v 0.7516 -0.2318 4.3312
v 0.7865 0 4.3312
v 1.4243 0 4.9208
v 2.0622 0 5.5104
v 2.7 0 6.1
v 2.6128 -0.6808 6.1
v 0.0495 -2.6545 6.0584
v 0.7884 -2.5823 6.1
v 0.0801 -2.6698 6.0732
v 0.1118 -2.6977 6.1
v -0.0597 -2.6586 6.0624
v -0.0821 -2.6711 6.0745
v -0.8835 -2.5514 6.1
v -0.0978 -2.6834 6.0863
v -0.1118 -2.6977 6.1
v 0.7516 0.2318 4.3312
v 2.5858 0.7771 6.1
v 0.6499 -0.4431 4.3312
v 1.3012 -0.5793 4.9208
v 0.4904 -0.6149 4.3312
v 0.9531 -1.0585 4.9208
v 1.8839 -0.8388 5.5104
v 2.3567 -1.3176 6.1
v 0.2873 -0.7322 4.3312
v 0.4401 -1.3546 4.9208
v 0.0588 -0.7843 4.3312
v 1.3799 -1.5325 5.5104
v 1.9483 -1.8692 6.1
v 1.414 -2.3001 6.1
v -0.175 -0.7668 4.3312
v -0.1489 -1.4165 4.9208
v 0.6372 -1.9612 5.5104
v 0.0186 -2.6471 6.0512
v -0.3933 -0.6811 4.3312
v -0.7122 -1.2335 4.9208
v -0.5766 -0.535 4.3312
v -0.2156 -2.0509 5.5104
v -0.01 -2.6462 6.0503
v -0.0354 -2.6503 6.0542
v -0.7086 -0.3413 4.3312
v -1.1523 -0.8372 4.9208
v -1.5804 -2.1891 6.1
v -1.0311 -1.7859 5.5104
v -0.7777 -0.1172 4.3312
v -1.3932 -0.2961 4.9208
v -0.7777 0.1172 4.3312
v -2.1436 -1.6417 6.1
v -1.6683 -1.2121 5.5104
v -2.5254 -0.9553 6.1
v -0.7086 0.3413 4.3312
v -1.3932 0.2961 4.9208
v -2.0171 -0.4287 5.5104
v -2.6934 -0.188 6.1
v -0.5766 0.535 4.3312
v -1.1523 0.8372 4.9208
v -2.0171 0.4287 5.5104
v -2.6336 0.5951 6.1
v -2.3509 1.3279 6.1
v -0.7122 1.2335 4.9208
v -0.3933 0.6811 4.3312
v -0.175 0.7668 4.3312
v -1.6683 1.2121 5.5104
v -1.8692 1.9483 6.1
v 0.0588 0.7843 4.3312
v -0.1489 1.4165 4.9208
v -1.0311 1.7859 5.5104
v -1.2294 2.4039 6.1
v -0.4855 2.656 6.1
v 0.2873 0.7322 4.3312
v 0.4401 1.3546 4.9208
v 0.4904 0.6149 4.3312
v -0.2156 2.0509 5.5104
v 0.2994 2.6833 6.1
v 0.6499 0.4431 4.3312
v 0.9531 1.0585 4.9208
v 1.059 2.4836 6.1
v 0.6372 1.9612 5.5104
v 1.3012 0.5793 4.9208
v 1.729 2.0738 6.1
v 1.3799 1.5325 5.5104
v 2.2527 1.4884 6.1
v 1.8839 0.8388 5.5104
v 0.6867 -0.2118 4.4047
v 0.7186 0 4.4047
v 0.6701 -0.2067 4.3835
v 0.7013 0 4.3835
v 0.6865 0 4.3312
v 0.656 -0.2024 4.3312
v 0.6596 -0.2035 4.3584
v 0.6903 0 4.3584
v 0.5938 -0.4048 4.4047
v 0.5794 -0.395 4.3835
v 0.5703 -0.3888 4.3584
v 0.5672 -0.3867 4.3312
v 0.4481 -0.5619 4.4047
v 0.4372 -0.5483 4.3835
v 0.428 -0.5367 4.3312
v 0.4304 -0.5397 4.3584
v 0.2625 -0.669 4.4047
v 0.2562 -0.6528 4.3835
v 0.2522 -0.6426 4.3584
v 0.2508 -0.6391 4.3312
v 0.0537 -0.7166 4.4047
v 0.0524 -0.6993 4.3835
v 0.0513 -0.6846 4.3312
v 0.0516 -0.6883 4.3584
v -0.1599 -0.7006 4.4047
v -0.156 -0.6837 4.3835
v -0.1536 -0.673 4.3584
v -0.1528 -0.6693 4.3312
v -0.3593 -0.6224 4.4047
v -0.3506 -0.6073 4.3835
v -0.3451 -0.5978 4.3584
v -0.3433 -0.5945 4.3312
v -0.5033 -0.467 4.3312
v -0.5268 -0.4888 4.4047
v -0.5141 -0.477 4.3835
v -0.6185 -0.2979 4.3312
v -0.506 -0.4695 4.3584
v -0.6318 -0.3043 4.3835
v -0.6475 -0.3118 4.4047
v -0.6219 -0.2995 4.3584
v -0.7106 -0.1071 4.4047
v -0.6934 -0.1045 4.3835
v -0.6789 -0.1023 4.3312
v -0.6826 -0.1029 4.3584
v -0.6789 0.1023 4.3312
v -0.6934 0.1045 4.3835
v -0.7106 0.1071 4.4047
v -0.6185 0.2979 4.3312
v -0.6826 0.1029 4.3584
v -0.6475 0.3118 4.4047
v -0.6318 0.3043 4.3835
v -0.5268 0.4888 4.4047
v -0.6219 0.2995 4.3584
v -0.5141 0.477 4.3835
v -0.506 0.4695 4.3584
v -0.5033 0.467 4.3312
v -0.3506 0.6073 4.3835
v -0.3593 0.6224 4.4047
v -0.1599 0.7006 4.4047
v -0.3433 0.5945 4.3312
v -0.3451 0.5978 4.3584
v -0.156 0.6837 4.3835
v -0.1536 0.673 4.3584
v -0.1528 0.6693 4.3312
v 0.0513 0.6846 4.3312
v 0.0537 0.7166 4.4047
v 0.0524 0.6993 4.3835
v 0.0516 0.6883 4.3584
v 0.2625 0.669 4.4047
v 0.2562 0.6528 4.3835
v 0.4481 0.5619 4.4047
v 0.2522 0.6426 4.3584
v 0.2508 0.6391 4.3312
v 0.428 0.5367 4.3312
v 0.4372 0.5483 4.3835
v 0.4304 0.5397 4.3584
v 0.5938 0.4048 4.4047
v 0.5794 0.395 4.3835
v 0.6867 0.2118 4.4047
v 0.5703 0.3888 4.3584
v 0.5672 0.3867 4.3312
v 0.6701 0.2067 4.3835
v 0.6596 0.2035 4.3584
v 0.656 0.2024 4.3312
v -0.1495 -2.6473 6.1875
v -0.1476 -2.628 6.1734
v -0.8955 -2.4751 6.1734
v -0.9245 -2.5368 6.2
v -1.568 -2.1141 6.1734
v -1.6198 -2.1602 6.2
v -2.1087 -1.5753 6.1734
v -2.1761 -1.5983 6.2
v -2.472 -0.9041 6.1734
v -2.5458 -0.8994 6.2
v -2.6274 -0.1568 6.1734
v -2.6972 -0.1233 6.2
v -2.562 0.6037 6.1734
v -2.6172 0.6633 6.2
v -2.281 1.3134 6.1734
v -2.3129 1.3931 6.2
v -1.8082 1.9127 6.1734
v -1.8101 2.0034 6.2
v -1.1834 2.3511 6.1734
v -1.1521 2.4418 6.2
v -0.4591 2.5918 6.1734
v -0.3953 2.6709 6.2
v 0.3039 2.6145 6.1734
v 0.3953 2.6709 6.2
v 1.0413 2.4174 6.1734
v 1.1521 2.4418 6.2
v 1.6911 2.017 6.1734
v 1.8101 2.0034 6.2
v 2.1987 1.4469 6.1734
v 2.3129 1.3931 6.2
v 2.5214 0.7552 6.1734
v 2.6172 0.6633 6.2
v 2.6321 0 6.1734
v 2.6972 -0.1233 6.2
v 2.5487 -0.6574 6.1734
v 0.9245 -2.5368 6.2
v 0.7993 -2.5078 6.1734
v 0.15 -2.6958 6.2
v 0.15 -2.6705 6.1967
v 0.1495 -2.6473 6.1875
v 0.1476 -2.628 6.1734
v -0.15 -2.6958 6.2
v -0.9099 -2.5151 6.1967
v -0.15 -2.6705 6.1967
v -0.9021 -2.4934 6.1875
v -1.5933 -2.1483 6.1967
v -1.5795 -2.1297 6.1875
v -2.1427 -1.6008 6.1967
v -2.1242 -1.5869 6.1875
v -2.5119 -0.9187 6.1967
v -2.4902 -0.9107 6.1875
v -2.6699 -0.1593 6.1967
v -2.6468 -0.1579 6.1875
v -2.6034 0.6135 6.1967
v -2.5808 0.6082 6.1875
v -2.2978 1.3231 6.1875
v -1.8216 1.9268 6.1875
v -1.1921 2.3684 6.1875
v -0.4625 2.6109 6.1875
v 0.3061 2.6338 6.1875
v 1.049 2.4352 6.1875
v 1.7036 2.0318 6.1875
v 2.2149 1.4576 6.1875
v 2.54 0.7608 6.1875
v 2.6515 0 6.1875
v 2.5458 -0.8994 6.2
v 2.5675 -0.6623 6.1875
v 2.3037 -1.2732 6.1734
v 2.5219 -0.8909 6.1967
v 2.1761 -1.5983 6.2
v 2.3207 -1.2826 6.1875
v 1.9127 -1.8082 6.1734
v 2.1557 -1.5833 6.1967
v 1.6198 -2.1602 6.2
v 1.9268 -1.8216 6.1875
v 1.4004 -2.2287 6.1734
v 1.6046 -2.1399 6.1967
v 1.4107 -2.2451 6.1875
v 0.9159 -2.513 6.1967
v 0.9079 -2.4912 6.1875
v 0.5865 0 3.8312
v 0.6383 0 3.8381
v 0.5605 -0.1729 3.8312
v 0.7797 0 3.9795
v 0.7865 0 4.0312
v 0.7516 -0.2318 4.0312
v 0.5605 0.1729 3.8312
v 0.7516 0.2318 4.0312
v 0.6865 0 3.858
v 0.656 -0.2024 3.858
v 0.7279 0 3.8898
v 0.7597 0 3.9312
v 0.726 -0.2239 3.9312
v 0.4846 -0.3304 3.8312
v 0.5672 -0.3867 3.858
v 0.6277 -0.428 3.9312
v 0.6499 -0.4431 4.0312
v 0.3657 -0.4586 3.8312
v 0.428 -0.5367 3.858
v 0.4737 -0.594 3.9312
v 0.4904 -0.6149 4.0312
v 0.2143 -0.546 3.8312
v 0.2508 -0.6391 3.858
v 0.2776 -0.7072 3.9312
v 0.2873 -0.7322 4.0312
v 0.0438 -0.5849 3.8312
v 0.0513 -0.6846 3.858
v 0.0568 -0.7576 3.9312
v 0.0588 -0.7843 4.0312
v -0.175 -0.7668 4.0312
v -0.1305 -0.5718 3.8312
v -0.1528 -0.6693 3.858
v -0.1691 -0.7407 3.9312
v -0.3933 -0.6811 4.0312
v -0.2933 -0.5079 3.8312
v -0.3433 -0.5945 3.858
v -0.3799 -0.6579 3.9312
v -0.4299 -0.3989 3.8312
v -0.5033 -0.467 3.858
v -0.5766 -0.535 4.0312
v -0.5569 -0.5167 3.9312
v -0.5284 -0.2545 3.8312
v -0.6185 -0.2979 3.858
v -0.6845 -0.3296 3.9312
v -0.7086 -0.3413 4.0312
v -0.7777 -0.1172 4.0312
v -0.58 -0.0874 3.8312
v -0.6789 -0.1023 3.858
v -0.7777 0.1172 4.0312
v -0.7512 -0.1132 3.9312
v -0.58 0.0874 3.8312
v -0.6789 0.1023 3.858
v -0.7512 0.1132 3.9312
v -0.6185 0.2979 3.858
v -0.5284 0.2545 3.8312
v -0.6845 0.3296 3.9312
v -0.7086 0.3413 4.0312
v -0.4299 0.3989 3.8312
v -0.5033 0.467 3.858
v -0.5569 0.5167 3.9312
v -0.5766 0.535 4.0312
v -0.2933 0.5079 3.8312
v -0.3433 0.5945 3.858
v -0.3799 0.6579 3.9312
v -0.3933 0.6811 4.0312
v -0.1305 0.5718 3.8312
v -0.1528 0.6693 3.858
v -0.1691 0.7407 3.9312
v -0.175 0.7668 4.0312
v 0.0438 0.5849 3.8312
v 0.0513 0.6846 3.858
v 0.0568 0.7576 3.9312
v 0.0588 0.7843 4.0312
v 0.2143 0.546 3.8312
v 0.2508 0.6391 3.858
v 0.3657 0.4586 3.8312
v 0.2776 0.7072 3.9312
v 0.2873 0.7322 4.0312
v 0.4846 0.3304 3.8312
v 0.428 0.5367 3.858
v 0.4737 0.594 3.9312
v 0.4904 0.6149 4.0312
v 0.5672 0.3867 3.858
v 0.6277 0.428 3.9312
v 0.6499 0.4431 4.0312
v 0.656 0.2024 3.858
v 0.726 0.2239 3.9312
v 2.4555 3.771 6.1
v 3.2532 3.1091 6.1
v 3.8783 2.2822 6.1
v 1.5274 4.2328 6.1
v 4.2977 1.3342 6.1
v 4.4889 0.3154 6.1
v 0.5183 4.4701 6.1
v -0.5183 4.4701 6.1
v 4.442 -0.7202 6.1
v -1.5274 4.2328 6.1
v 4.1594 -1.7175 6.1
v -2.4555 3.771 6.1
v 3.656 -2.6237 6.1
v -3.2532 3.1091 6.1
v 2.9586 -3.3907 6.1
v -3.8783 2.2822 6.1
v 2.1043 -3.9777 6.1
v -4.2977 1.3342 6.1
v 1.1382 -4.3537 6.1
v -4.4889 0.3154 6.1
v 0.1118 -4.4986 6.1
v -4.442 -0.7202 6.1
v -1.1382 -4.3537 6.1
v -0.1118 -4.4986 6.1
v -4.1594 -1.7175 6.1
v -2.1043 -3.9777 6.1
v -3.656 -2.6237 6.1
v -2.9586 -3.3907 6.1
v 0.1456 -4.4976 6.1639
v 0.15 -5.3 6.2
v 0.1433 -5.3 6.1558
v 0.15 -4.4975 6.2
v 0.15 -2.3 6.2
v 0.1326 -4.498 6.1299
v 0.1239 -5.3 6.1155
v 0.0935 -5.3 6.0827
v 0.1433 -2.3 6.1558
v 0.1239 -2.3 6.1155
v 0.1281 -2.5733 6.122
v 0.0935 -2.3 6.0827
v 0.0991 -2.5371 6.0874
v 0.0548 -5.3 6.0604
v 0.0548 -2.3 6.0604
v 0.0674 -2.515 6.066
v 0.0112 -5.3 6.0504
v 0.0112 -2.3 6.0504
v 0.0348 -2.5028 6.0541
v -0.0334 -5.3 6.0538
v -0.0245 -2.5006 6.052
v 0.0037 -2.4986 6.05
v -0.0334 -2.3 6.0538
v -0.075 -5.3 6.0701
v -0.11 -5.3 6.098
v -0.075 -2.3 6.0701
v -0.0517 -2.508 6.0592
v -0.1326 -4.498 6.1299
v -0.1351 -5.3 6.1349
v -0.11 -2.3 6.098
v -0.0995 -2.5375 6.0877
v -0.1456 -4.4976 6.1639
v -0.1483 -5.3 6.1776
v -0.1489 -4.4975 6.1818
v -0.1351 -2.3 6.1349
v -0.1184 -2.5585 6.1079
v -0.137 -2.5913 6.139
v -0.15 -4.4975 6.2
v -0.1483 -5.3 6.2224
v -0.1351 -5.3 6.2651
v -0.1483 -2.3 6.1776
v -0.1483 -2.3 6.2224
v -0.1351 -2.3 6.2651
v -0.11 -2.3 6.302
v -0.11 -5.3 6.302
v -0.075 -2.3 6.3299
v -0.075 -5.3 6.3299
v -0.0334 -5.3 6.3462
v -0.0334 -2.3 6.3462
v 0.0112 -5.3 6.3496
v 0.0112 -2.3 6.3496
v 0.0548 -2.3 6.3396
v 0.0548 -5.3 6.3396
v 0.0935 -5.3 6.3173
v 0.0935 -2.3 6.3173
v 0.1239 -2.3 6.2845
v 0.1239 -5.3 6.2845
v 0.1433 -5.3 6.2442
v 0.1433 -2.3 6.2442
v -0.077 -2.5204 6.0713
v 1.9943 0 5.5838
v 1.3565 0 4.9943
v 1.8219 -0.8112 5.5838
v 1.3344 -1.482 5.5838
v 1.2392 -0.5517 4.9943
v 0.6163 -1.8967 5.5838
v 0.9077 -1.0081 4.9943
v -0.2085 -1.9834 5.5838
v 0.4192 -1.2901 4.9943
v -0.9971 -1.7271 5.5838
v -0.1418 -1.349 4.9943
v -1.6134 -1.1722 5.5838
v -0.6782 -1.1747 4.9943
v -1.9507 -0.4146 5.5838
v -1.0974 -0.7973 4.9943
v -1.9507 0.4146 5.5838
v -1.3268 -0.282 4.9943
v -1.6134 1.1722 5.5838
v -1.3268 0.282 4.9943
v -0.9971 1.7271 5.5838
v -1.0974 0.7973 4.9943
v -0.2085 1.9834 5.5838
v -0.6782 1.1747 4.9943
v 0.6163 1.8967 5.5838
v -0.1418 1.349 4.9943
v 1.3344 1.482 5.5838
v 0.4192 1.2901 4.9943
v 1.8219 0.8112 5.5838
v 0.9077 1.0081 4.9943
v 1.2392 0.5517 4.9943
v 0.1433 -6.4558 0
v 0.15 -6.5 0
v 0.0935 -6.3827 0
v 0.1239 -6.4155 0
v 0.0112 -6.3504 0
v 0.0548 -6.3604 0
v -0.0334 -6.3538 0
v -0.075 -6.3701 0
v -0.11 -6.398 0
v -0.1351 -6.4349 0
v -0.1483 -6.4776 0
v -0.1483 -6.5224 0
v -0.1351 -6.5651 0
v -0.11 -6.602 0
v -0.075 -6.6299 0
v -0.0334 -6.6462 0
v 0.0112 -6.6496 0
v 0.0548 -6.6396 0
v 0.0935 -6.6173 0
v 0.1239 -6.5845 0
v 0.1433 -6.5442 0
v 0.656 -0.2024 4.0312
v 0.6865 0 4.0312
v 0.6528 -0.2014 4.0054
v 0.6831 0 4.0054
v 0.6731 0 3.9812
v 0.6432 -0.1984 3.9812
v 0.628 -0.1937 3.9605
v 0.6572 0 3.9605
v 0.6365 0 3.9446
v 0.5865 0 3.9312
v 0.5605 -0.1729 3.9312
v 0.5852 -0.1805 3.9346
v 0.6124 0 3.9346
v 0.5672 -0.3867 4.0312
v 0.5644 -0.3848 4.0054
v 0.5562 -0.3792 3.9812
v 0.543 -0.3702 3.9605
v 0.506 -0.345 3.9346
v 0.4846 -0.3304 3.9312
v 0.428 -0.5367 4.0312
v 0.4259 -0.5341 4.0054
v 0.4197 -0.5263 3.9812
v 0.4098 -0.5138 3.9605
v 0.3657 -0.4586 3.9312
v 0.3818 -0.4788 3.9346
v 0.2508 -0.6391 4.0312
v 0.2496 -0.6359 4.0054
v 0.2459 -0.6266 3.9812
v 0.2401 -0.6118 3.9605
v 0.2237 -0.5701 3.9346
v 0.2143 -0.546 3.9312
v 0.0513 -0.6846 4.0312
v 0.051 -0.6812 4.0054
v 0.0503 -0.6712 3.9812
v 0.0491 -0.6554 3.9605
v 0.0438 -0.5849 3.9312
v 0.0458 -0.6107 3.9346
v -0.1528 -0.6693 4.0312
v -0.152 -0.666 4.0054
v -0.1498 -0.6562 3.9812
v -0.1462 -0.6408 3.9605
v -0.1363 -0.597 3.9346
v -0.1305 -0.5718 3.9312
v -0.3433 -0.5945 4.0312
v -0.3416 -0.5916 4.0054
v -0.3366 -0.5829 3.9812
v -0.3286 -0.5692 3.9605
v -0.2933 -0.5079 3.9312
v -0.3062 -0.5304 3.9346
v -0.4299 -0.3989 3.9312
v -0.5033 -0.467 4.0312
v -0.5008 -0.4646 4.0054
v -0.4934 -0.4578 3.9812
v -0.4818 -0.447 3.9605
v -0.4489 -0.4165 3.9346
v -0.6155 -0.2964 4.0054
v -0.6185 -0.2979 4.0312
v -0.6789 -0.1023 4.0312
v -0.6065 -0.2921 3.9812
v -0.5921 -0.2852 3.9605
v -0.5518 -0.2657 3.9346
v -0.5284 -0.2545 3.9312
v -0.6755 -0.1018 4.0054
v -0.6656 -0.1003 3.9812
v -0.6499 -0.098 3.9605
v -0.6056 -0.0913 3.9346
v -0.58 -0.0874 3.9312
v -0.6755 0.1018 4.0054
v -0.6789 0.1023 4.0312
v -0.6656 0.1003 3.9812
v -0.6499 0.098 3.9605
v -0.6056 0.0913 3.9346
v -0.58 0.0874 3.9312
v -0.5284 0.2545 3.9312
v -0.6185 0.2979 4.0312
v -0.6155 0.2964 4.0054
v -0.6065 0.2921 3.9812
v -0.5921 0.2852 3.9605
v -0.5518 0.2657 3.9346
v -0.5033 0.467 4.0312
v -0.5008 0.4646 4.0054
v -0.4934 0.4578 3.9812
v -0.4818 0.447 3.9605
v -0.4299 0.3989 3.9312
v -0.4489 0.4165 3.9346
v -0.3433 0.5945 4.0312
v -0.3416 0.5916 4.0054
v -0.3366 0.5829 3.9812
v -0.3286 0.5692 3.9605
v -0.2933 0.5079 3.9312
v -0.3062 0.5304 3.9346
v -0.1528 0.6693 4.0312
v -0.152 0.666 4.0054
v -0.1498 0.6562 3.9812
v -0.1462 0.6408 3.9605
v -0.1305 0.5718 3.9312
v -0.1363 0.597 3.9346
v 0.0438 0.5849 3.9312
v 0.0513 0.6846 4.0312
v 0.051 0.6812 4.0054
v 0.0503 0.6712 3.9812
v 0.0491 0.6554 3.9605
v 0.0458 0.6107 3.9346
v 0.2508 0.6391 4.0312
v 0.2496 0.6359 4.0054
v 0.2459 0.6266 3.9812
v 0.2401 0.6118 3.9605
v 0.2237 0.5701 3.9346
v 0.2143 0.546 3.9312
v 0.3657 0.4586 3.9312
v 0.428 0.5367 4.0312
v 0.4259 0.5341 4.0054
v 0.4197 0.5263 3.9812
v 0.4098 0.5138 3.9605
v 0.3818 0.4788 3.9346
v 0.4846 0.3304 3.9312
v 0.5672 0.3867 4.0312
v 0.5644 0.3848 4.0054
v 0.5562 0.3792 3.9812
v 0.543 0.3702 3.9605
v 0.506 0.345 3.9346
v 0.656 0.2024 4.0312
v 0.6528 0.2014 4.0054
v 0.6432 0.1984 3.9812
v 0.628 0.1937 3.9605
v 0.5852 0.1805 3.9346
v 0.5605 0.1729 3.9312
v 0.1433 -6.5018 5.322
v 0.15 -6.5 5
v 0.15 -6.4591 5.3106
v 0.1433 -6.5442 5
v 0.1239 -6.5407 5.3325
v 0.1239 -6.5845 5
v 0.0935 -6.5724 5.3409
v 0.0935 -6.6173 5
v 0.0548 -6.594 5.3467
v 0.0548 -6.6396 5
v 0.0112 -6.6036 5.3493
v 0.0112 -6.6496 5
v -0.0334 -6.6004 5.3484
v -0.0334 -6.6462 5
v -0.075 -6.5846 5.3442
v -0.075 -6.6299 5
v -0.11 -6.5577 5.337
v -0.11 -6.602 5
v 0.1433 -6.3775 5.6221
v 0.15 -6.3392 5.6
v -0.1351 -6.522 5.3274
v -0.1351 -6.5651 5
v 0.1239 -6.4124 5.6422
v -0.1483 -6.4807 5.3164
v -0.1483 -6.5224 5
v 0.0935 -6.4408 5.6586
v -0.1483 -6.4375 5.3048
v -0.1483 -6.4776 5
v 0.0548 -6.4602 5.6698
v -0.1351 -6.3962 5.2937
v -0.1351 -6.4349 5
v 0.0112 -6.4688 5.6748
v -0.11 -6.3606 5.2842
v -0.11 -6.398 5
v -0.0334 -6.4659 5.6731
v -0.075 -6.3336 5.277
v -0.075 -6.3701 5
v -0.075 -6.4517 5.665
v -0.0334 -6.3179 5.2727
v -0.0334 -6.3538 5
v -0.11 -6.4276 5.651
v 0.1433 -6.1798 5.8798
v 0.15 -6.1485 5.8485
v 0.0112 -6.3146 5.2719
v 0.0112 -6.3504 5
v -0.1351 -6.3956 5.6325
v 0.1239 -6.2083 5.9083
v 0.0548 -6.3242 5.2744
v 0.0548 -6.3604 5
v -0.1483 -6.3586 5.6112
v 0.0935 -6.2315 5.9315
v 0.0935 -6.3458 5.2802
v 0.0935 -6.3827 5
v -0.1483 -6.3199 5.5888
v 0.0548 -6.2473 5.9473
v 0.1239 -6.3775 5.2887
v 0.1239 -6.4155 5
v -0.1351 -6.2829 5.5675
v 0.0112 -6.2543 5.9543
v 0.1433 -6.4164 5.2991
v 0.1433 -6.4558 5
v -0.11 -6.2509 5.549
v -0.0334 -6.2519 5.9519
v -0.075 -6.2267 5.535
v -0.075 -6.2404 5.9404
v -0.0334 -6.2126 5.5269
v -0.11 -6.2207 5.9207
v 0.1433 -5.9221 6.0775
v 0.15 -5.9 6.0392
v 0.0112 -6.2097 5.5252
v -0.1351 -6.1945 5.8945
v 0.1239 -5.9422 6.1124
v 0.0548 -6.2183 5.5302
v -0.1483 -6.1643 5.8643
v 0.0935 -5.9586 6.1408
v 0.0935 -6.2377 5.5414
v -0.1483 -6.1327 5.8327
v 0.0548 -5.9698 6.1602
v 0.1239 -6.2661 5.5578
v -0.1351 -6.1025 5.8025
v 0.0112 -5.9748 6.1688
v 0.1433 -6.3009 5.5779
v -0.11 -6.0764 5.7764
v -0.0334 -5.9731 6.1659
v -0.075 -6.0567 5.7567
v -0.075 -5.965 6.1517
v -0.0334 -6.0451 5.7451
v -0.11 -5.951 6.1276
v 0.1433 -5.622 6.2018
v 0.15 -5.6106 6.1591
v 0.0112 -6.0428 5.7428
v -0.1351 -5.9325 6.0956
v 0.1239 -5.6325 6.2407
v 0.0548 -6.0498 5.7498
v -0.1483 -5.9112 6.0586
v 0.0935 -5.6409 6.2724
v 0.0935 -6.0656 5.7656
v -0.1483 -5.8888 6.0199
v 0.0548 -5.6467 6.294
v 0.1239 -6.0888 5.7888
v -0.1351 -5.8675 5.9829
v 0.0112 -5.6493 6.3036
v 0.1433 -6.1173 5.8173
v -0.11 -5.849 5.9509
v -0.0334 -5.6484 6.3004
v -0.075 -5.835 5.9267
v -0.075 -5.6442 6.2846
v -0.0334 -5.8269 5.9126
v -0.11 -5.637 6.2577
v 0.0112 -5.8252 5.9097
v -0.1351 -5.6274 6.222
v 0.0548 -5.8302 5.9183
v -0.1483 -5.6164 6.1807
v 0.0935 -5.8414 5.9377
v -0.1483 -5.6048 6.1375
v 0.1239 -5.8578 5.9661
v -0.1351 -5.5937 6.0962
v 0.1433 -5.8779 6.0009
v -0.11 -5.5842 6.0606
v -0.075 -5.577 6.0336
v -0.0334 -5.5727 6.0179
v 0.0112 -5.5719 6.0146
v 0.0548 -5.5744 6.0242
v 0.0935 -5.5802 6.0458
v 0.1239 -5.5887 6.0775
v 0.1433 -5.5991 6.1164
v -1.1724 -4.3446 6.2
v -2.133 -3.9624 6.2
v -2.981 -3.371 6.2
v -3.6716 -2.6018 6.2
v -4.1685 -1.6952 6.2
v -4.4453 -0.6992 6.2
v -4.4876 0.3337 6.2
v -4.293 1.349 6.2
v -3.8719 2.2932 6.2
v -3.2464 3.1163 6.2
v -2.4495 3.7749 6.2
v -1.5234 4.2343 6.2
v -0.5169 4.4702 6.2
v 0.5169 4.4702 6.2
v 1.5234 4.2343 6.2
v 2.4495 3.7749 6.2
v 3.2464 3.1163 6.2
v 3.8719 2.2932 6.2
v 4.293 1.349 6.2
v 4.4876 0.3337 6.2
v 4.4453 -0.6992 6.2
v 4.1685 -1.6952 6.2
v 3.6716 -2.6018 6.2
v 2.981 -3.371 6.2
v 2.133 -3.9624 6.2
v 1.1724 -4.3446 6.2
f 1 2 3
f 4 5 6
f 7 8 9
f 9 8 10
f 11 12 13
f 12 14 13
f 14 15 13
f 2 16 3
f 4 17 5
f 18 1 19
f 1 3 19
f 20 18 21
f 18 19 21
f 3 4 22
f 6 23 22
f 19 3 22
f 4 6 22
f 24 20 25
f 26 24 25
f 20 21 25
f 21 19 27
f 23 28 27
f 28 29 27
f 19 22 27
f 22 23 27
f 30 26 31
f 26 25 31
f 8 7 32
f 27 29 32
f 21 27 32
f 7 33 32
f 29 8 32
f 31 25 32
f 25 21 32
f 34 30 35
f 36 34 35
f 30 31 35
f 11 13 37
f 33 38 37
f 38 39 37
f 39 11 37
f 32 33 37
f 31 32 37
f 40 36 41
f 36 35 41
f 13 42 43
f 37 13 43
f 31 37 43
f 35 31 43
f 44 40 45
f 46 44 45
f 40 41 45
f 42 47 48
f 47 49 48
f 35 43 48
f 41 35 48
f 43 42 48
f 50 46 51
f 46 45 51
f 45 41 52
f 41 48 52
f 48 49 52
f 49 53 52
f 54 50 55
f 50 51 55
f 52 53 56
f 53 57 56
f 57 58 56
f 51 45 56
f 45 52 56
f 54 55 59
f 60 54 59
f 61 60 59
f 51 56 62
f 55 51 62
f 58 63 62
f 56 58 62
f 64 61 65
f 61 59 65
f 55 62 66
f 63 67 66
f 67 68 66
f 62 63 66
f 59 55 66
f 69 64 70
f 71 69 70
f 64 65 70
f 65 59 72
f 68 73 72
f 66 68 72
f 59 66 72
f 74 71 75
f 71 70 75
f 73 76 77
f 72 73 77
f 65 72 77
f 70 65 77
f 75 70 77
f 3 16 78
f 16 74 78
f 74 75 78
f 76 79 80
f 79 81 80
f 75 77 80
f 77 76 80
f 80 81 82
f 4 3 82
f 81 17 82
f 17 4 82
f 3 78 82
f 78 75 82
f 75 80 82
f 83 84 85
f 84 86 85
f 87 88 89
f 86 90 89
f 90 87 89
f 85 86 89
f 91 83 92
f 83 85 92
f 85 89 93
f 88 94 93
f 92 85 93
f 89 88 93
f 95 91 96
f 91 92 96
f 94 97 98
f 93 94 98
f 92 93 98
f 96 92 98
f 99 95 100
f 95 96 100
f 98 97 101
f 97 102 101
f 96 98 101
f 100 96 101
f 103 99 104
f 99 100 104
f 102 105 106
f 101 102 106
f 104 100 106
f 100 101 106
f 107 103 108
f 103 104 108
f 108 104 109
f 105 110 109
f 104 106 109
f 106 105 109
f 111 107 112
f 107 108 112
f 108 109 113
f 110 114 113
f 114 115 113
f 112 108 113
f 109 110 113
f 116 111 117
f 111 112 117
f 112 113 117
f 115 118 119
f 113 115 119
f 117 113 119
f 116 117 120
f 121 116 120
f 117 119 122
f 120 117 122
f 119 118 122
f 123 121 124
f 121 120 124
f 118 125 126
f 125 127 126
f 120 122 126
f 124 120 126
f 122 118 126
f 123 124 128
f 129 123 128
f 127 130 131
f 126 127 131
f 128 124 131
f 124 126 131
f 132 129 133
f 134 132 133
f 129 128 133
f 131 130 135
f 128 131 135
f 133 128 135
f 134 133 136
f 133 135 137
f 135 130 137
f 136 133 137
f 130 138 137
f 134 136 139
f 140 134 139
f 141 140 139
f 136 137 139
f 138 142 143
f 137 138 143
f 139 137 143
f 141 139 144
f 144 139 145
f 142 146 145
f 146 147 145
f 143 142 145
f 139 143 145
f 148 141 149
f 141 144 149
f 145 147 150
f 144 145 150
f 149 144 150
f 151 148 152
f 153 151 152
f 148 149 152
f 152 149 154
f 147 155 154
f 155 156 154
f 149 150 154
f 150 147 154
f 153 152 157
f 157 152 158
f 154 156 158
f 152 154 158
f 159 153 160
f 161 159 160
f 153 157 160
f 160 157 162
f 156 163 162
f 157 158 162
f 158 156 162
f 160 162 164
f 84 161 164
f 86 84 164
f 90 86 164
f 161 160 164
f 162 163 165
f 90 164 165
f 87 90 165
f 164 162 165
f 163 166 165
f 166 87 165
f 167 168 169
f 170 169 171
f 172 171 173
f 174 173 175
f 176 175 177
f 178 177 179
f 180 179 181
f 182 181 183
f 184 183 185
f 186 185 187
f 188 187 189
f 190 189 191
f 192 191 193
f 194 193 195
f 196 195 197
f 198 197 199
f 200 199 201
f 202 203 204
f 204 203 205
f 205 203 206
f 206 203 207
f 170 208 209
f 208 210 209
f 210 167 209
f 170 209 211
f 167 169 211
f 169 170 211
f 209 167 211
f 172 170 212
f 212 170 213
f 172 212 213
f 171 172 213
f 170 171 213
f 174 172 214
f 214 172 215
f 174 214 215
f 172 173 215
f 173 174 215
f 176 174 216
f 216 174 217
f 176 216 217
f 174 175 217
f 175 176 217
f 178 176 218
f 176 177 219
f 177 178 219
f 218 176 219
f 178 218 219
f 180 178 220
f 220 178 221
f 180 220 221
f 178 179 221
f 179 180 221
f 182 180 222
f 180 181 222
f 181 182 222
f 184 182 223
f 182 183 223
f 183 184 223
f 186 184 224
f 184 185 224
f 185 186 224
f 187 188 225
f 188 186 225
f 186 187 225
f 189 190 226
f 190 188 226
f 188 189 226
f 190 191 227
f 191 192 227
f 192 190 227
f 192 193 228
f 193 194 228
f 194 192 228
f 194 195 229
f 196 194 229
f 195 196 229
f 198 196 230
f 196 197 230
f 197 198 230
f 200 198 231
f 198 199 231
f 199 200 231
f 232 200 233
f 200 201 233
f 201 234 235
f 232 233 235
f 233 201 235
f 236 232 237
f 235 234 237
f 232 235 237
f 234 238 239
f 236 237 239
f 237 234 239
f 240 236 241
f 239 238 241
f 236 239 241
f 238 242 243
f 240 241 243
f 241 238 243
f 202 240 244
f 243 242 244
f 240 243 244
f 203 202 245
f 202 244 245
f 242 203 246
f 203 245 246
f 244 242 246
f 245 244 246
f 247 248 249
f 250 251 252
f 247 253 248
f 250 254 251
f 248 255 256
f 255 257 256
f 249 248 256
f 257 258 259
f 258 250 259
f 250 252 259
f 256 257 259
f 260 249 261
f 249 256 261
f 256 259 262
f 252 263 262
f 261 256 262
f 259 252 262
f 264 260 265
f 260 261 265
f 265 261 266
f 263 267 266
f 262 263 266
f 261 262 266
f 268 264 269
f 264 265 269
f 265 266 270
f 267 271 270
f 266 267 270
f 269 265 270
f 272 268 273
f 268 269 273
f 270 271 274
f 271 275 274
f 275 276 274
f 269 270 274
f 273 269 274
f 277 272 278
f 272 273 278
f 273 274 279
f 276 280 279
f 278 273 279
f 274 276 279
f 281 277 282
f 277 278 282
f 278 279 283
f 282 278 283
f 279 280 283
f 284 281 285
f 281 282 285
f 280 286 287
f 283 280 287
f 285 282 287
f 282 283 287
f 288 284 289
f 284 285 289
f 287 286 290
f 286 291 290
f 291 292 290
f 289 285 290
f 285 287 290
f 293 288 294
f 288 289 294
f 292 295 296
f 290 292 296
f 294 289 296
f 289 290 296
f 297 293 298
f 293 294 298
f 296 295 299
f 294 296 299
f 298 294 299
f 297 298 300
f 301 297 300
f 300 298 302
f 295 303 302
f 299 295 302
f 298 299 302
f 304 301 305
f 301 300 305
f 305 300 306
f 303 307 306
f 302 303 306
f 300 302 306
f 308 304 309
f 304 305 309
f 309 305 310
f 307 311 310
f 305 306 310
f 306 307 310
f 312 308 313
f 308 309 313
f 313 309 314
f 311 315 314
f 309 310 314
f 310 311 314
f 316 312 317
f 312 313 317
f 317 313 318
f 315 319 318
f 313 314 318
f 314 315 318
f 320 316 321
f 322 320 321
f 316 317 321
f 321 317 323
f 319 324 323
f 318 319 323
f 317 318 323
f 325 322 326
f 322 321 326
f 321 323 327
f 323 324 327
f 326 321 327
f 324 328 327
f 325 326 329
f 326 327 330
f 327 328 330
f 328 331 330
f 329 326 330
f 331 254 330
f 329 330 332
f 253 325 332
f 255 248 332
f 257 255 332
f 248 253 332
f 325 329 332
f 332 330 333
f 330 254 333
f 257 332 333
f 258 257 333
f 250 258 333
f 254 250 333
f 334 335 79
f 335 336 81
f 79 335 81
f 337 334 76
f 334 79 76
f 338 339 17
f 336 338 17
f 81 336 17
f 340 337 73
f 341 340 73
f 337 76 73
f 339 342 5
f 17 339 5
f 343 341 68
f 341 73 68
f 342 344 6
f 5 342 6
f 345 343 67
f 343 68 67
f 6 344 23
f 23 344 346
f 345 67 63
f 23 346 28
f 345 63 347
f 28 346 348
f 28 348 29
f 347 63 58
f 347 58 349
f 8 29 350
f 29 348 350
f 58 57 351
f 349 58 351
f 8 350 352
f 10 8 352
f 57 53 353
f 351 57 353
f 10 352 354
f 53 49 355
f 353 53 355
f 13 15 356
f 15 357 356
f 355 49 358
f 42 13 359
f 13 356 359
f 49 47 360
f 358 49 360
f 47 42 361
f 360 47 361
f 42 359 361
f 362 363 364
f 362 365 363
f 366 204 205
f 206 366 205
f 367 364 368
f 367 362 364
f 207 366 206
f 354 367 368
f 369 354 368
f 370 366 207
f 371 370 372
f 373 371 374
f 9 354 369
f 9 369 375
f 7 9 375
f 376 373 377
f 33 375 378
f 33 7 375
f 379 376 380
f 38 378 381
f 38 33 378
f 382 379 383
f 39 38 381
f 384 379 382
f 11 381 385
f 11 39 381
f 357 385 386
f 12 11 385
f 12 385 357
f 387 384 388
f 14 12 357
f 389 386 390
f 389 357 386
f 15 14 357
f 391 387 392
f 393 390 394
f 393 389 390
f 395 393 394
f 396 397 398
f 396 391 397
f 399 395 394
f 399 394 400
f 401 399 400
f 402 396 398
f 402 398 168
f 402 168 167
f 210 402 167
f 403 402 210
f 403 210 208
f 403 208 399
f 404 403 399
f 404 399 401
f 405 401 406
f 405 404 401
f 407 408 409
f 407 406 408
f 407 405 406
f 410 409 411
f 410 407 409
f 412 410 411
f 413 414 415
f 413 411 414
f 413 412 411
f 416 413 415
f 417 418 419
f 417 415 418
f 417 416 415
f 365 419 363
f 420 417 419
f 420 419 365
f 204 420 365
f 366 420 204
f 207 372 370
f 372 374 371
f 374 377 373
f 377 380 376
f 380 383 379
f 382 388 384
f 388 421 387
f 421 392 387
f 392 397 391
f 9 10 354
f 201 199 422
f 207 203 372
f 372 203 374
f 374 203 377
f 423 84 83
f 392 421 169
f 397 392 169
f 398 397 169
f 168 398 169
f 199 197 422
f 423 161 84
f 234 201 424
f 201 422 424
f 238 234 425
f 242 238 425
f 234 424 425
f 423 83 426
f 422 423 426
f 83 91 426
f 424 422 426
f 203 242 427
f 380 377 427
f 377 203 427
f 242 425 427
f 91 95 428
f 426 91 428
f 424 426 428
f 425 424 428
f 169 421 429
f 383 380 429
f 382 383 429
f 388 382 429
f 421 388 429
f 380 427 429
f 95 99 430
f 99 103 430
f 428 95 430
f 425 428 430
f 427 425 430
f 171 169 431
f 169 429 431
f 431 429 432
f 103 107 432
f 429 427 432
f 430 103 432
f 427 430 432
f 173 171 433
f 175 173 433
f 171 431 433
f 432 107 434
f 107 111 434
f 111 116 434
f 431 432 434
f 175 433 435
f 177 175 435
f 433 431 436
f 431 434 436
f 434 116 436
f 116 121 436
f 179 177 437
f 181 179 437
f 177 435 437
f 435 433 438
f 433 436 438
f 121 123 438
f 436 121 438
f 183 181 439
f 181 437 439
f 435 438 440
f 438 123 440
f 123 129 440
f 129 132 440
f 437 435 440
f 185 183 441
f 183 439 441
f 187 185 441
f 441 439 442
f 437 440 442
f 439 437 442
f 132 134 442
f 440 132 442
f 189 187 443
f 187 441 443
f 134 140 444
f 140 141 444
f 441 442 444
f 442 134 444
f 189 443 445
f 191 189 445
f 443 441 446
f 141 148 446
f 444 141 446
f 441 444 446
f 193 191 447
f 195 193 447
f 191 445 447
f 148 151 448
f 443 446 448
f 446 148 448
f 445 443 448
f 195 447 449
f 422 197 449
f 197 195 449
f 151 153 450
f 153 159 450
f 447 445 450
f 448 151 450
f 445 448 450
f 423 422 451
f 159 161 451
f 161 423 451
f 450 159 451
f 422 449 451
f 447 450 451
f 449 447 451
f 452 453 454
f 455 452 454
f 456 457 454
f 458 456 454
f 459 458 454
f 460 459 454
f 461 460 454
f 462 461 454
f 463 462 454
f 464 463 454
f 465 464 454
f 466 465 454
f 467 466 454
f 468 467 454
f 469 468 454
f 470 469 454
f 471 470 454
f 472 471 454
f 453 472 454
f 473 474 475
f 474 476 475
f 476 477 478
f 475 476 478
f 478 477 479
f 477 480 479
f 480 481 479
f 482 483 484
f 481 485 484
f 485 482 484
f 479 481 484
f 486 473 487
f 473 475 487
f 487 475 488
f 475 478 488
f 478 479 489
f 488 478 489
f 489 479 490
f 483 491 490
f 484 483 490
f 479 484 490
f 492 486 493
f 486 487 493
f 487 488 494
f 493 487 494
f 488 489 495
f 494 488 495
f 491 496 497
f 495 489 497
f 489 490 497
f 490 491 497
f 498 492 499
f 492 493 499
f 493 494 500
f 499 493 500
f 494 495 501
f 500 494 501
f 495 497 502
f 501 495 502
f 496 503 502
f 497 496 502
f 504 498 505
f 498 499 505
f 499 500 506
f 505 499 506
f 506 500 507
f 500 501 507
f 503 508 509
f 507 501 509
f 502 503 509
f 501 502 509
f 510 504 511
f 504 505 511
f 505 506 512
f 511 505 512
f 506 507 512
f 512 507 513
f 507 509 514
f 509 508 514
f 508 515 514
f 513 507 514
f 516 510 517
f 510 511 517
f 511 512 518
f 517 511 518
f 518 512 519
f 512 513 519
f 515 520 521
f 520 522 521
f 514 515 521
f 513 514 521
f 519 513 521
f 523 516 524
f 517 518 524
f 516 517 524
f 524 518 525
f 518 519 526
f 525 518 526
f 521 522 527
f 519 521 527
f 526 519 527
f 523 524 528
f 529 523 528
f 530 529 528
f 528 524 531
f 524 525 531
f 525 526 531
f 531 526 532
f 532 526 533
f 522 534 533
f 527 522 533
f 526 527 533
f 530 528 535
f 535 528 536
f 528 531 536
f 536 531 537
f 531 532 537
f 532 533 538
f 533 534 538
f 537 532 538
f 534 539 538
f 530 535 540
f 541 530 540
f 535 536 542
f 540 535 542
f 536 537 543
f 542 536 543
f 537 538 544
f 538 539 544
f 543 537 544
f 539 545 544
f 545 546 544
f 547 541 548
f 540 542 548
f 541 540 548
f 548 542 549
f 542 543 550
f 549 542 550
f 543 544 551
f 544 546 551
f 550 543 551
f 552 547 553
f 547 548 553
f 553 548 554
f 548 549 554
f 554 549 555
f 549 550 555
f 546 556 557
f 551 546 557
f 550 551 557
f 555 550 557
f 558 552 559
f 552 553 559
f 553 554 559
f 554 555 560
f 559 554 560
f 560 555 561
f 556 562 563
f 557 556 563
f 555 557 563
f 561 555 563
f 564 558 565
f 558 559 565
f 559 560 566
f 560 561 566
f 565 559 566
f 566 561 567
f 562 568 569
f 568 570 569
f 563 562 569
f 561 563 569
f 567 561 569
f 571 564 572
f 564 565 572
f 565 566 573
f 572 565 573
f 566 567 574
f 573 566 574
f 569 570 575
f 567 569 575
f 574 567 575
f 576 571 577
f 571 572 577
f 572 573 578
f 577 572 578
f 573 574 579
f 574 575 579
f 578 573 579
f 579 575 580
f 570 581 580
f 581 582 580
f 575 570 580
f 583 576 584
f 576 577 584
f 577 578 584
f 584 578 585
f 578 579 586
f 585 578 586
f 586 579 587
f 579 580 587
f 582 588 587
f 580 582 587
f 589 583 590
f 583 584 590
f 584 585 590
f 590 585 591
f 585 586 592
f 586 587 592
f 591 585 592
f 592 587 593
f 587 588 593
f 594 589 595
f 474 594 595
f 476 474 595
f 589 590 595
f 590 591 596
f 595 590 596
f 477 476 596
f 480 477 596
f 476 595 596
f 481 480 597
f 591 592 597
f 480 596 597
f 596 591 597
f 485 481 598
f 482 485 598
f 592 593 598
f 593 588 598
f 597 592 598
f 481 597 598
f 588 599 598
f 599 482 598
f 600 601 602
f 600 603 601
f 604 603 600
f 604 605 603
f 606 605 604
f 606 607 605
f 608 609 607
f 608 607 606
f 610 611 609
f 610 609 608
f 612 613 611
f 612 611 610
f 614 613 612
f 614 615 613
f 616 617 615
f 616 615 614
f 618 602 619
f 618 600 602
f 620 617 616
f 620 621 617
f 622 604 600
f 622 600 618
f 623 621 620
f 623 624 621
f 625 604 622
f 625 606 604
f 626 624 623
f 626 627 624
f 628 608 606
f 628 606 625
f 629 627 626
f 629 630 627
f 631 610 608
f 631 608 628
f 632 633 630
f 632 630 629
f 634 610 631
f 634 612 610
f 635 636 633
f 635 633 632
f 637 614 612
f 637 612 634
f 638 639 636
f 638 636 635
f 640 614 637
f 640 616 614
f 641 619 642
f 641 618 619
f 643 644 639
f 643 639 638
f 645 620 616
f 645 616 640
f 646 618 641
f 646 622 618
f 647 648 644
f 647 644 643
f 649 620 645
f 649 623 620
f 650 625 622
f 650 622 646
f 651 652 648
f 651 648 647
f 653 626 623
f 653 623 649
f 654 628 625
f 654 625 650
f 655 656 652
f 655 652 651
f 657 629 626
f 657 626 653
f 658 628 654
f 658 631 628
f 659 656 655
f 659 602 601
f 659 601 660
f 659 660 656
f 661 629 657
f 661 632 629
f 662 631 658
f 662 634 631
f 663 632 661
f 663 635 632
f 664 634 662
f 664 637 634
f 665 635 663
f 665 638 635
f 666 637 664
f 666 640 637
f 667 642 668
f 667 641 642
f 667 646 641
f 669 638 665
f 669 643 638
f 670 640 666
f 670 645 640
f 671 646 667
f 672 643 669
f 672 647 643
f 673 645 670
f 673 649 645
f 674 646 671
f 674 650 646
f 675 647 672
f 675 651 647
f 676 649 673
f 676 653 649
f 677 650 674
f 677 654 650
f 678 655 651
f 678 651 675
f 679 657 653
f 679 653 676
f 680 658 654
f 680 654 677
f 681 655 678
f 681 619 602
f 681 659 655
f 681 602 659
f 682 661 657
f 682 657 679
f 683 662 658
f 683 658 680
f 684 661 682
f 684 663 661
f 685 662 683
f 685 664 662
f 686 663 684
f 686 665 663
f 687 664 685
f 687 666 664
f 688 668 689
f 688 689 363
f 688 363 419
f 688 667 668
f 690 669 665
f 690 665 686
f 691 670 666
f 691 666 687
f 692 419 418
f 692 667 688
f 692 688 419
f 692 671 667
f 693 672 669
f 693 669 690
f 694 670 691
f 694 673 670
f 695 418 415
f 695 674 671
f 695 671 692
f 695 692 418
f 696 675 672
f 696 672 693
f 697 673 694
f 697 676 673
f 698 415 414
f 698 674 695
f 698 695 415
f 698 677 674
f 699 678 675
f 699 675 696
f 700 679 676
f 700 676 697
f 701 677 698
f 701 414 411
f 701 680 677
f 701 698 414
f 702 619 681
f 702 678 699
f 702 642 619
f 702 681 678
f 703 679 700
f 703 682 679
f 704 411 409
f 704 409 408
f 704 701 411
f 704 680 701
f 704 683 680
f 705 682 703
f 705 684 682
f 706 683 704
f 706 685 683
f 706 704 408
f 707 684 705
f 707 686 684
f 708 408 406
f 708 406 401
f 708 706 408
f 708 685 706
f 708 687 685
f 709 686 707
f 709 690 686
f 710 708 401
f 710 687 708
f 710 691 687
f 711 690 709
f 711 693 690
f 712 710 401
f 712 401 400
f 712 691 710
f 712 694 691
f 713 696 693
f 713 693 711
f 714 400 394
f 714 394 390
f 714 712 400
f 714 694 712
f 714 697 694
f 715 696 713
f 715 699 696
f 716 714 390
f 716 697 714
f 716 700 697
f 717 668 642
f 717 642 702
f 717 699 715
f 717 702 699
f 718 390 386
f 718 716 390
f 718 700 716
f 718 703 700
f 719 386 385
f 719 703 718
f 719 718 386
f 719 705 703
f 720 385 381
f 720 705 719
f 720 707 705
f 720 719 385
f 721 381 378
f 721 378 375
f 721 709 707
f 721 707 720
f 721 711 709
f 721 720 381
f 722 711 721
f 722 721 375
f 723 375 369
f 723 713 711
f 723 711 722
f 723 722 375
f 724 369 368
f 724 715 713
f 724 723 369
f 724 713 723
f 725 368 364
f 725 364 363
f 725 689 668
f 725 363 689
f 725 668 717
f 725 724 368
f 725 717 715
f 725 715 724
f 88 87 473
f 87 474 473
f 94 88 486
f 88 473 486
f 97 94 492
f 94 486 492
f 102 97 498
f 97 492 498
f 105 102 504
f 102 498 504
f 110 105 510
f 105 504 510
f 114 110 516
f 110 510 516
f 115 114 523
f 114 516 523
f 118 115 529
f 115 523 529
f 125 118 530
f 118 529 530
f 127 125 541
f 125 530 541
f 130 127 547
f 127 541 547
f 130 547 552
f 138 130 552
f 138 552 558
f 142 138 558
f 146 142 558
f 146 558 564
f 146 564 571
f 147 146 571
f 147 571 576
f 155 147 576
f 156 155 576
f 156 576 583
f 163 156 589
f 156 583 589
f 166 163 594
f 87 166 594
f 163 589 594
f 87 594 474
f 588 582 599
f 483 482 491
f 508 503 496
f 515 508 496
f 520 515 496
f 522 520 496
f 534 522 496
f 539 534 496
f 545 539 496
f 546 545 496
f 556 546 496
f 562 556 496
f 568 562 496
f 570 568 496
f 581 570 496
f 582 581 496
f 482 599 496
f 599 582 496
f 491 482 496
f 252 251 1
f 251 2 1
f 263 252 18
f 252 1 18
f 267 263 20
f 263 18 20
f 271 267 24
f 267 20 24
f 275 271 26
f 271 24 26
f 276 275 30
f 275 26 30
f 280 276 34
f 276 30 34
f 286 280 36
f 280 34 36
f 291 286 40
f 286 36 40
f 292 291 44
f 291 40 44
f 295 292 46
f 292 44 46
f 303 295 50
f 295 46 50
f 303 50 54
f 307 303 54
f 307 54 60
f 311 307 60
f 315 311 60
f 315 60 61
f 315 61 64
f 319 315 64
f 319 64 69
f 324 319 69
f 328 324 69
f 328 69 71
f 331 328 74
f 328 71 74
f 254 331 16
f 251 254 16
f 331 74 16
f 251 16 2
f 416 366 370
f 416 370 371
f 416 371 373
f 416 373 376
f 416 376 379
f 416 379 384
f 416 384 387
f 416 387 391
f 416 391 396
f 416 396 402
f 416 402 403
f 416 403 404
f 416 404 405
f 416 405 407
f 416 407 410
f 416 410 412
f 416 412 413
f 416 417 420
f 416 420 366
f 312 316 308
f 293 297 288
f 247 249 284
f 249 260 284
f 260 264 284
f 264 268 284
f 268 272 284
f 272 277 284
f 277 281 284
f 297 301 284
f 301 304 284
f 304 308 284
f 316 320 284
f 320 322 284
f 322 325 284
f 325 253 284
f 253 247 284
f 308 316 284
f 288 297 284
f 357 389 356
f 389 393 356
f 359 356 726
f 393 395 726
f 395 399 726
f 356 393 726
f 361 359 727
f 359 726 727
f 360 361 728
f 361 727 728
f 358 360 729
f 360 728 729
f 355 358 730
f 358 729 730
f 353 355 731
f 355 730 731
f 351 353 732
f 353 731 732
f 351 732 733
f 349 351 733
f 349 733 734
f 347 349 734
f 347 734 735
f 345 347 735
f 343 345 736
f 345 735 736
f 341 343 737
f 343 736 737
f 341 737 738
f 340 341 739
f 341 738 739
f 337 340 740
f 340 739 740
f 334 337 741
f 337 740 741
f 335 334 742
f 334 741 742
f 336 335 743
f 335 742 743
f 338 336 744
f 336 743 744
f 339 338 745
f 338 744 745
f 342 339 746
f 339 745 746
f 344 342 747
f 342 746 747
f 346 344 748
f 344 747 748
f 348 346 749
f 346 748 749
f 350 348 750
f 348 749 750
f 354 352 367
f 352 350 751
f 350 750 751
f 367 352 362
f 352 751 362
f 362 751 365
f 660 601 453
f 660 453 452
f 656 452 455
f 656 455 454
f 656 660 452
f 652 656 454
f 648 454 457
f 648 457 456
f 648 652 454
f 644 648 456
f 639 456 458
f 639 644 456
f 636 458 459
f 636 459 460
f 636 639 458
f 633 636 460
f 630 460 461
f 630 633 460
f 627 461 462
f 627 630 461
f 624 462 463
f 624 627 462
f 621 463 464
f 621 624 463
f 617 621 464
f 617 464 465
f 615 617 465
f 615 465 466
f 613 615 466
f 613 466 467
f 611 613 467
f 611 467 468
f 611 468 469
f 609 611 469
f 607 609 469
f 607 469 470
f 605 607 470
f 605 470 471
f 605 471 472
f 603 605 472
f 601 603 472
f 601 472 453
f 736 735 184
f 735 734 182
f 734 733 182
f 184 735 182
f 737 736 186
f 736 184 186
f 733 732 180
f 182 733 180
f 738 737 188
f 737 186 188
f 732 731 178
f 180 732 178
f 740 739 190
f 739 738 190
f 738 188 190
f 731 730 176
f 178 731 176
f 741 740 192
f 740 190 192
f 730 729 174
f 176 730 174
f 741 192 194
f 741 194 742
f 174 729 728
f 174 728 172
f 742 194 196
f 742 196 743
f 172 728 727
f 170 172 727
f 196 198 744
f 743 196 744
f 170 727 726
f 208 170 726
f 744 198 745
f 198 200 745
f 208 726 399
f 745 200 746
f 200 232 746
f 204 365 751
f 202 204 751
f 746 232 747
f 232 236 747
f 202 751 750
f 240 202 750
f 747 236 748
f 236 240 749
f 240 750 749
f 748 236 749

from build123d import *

# Parameters (mm, degrees)
SKETCH3_R = 0.15


with BuildPart() as part:
    # Sweep1: sweep along a path in Sketch4
    with BuildLine(Plane(origin=(0, 0, 0), x_dir=(0, 0, -1), z_dir=(1, 0, 0))) as sweep1_path:
        Line((0, -6.5), (-5, -6.5))
        ThreePointArc((-5, -6.5), (-5.848528137, -6.148528137), (-6.2, -5.3))
        Line((-6.2, -5.3), (-6.2, -2.3))
    # Sketch3 → Sweep1 (sweep)
    with BuildSketch(Plane.XY):
        with Locations((0, -6.5)):
            Circle(SKETCH3_R)
    sweep(path=sweep1_path.line)

    # Sketch6 → Revolve1 (revolve)
    with BuildSketch(Plane(origin=(0, 0, 0), x_dir=(0, 0, -1), z_dir=(1, 0, 0)), mode=Mode.PRIVATE) as revolve1_sk:
        with BuildLine():
            Line((-6.2, -4.5), (-6.2, -2.7))
            ThreePointArc((-6.2, -2.7), (-6.193121719, -2.663553527), (-6.173433093, -2.632120836))
            Line((-6.173433093, -2.632120836), (-4.404673955, -0.718640373))
            ThreePointArc((-4.404673955, -0.718640373), (-4.371316313, -0.69490099), (-4.331240862, -0.686519537))
            Line((-4.331240862, -0.686519537), (-4.031240862, -0.686519537))
            ThreePointArc((-4.031240862, -0.686519537), (-3.960530184, -0.657230215), (-3.931240862, -0.586519537))
            Line((-3.931240862, -0.586519537), (-3.931240862, 0))
            Line((-3.931240862, 0), (-3.831240862, 0))
            Line((-3.831240862, 0), (-3.831240862, -0.586519537))
            ThreePointArc((-3.831240862, -0.586519537), (-3.889819506, -0.727940893), (-4.031240862, -0.786519537))
            Line((-4.031240862, -0.786519537), (-4.331240862, -0.786519537))
            Line((-4.331240862, -0.786519537), (-6.1, -2.7))
            Line((-6.1, -2.7), (-6.1, -4.5))
            Line((-6.1, -4.5), (-6.2, -4.5))
        make_face()
    revolve(revolve1_sk.sketch.rotate(Axis((0, 0, 6.2), (0, 0, -1)), 270), axis=Axis((0, 0, 6.2), (0, 0, -1)))


solid = part.part
